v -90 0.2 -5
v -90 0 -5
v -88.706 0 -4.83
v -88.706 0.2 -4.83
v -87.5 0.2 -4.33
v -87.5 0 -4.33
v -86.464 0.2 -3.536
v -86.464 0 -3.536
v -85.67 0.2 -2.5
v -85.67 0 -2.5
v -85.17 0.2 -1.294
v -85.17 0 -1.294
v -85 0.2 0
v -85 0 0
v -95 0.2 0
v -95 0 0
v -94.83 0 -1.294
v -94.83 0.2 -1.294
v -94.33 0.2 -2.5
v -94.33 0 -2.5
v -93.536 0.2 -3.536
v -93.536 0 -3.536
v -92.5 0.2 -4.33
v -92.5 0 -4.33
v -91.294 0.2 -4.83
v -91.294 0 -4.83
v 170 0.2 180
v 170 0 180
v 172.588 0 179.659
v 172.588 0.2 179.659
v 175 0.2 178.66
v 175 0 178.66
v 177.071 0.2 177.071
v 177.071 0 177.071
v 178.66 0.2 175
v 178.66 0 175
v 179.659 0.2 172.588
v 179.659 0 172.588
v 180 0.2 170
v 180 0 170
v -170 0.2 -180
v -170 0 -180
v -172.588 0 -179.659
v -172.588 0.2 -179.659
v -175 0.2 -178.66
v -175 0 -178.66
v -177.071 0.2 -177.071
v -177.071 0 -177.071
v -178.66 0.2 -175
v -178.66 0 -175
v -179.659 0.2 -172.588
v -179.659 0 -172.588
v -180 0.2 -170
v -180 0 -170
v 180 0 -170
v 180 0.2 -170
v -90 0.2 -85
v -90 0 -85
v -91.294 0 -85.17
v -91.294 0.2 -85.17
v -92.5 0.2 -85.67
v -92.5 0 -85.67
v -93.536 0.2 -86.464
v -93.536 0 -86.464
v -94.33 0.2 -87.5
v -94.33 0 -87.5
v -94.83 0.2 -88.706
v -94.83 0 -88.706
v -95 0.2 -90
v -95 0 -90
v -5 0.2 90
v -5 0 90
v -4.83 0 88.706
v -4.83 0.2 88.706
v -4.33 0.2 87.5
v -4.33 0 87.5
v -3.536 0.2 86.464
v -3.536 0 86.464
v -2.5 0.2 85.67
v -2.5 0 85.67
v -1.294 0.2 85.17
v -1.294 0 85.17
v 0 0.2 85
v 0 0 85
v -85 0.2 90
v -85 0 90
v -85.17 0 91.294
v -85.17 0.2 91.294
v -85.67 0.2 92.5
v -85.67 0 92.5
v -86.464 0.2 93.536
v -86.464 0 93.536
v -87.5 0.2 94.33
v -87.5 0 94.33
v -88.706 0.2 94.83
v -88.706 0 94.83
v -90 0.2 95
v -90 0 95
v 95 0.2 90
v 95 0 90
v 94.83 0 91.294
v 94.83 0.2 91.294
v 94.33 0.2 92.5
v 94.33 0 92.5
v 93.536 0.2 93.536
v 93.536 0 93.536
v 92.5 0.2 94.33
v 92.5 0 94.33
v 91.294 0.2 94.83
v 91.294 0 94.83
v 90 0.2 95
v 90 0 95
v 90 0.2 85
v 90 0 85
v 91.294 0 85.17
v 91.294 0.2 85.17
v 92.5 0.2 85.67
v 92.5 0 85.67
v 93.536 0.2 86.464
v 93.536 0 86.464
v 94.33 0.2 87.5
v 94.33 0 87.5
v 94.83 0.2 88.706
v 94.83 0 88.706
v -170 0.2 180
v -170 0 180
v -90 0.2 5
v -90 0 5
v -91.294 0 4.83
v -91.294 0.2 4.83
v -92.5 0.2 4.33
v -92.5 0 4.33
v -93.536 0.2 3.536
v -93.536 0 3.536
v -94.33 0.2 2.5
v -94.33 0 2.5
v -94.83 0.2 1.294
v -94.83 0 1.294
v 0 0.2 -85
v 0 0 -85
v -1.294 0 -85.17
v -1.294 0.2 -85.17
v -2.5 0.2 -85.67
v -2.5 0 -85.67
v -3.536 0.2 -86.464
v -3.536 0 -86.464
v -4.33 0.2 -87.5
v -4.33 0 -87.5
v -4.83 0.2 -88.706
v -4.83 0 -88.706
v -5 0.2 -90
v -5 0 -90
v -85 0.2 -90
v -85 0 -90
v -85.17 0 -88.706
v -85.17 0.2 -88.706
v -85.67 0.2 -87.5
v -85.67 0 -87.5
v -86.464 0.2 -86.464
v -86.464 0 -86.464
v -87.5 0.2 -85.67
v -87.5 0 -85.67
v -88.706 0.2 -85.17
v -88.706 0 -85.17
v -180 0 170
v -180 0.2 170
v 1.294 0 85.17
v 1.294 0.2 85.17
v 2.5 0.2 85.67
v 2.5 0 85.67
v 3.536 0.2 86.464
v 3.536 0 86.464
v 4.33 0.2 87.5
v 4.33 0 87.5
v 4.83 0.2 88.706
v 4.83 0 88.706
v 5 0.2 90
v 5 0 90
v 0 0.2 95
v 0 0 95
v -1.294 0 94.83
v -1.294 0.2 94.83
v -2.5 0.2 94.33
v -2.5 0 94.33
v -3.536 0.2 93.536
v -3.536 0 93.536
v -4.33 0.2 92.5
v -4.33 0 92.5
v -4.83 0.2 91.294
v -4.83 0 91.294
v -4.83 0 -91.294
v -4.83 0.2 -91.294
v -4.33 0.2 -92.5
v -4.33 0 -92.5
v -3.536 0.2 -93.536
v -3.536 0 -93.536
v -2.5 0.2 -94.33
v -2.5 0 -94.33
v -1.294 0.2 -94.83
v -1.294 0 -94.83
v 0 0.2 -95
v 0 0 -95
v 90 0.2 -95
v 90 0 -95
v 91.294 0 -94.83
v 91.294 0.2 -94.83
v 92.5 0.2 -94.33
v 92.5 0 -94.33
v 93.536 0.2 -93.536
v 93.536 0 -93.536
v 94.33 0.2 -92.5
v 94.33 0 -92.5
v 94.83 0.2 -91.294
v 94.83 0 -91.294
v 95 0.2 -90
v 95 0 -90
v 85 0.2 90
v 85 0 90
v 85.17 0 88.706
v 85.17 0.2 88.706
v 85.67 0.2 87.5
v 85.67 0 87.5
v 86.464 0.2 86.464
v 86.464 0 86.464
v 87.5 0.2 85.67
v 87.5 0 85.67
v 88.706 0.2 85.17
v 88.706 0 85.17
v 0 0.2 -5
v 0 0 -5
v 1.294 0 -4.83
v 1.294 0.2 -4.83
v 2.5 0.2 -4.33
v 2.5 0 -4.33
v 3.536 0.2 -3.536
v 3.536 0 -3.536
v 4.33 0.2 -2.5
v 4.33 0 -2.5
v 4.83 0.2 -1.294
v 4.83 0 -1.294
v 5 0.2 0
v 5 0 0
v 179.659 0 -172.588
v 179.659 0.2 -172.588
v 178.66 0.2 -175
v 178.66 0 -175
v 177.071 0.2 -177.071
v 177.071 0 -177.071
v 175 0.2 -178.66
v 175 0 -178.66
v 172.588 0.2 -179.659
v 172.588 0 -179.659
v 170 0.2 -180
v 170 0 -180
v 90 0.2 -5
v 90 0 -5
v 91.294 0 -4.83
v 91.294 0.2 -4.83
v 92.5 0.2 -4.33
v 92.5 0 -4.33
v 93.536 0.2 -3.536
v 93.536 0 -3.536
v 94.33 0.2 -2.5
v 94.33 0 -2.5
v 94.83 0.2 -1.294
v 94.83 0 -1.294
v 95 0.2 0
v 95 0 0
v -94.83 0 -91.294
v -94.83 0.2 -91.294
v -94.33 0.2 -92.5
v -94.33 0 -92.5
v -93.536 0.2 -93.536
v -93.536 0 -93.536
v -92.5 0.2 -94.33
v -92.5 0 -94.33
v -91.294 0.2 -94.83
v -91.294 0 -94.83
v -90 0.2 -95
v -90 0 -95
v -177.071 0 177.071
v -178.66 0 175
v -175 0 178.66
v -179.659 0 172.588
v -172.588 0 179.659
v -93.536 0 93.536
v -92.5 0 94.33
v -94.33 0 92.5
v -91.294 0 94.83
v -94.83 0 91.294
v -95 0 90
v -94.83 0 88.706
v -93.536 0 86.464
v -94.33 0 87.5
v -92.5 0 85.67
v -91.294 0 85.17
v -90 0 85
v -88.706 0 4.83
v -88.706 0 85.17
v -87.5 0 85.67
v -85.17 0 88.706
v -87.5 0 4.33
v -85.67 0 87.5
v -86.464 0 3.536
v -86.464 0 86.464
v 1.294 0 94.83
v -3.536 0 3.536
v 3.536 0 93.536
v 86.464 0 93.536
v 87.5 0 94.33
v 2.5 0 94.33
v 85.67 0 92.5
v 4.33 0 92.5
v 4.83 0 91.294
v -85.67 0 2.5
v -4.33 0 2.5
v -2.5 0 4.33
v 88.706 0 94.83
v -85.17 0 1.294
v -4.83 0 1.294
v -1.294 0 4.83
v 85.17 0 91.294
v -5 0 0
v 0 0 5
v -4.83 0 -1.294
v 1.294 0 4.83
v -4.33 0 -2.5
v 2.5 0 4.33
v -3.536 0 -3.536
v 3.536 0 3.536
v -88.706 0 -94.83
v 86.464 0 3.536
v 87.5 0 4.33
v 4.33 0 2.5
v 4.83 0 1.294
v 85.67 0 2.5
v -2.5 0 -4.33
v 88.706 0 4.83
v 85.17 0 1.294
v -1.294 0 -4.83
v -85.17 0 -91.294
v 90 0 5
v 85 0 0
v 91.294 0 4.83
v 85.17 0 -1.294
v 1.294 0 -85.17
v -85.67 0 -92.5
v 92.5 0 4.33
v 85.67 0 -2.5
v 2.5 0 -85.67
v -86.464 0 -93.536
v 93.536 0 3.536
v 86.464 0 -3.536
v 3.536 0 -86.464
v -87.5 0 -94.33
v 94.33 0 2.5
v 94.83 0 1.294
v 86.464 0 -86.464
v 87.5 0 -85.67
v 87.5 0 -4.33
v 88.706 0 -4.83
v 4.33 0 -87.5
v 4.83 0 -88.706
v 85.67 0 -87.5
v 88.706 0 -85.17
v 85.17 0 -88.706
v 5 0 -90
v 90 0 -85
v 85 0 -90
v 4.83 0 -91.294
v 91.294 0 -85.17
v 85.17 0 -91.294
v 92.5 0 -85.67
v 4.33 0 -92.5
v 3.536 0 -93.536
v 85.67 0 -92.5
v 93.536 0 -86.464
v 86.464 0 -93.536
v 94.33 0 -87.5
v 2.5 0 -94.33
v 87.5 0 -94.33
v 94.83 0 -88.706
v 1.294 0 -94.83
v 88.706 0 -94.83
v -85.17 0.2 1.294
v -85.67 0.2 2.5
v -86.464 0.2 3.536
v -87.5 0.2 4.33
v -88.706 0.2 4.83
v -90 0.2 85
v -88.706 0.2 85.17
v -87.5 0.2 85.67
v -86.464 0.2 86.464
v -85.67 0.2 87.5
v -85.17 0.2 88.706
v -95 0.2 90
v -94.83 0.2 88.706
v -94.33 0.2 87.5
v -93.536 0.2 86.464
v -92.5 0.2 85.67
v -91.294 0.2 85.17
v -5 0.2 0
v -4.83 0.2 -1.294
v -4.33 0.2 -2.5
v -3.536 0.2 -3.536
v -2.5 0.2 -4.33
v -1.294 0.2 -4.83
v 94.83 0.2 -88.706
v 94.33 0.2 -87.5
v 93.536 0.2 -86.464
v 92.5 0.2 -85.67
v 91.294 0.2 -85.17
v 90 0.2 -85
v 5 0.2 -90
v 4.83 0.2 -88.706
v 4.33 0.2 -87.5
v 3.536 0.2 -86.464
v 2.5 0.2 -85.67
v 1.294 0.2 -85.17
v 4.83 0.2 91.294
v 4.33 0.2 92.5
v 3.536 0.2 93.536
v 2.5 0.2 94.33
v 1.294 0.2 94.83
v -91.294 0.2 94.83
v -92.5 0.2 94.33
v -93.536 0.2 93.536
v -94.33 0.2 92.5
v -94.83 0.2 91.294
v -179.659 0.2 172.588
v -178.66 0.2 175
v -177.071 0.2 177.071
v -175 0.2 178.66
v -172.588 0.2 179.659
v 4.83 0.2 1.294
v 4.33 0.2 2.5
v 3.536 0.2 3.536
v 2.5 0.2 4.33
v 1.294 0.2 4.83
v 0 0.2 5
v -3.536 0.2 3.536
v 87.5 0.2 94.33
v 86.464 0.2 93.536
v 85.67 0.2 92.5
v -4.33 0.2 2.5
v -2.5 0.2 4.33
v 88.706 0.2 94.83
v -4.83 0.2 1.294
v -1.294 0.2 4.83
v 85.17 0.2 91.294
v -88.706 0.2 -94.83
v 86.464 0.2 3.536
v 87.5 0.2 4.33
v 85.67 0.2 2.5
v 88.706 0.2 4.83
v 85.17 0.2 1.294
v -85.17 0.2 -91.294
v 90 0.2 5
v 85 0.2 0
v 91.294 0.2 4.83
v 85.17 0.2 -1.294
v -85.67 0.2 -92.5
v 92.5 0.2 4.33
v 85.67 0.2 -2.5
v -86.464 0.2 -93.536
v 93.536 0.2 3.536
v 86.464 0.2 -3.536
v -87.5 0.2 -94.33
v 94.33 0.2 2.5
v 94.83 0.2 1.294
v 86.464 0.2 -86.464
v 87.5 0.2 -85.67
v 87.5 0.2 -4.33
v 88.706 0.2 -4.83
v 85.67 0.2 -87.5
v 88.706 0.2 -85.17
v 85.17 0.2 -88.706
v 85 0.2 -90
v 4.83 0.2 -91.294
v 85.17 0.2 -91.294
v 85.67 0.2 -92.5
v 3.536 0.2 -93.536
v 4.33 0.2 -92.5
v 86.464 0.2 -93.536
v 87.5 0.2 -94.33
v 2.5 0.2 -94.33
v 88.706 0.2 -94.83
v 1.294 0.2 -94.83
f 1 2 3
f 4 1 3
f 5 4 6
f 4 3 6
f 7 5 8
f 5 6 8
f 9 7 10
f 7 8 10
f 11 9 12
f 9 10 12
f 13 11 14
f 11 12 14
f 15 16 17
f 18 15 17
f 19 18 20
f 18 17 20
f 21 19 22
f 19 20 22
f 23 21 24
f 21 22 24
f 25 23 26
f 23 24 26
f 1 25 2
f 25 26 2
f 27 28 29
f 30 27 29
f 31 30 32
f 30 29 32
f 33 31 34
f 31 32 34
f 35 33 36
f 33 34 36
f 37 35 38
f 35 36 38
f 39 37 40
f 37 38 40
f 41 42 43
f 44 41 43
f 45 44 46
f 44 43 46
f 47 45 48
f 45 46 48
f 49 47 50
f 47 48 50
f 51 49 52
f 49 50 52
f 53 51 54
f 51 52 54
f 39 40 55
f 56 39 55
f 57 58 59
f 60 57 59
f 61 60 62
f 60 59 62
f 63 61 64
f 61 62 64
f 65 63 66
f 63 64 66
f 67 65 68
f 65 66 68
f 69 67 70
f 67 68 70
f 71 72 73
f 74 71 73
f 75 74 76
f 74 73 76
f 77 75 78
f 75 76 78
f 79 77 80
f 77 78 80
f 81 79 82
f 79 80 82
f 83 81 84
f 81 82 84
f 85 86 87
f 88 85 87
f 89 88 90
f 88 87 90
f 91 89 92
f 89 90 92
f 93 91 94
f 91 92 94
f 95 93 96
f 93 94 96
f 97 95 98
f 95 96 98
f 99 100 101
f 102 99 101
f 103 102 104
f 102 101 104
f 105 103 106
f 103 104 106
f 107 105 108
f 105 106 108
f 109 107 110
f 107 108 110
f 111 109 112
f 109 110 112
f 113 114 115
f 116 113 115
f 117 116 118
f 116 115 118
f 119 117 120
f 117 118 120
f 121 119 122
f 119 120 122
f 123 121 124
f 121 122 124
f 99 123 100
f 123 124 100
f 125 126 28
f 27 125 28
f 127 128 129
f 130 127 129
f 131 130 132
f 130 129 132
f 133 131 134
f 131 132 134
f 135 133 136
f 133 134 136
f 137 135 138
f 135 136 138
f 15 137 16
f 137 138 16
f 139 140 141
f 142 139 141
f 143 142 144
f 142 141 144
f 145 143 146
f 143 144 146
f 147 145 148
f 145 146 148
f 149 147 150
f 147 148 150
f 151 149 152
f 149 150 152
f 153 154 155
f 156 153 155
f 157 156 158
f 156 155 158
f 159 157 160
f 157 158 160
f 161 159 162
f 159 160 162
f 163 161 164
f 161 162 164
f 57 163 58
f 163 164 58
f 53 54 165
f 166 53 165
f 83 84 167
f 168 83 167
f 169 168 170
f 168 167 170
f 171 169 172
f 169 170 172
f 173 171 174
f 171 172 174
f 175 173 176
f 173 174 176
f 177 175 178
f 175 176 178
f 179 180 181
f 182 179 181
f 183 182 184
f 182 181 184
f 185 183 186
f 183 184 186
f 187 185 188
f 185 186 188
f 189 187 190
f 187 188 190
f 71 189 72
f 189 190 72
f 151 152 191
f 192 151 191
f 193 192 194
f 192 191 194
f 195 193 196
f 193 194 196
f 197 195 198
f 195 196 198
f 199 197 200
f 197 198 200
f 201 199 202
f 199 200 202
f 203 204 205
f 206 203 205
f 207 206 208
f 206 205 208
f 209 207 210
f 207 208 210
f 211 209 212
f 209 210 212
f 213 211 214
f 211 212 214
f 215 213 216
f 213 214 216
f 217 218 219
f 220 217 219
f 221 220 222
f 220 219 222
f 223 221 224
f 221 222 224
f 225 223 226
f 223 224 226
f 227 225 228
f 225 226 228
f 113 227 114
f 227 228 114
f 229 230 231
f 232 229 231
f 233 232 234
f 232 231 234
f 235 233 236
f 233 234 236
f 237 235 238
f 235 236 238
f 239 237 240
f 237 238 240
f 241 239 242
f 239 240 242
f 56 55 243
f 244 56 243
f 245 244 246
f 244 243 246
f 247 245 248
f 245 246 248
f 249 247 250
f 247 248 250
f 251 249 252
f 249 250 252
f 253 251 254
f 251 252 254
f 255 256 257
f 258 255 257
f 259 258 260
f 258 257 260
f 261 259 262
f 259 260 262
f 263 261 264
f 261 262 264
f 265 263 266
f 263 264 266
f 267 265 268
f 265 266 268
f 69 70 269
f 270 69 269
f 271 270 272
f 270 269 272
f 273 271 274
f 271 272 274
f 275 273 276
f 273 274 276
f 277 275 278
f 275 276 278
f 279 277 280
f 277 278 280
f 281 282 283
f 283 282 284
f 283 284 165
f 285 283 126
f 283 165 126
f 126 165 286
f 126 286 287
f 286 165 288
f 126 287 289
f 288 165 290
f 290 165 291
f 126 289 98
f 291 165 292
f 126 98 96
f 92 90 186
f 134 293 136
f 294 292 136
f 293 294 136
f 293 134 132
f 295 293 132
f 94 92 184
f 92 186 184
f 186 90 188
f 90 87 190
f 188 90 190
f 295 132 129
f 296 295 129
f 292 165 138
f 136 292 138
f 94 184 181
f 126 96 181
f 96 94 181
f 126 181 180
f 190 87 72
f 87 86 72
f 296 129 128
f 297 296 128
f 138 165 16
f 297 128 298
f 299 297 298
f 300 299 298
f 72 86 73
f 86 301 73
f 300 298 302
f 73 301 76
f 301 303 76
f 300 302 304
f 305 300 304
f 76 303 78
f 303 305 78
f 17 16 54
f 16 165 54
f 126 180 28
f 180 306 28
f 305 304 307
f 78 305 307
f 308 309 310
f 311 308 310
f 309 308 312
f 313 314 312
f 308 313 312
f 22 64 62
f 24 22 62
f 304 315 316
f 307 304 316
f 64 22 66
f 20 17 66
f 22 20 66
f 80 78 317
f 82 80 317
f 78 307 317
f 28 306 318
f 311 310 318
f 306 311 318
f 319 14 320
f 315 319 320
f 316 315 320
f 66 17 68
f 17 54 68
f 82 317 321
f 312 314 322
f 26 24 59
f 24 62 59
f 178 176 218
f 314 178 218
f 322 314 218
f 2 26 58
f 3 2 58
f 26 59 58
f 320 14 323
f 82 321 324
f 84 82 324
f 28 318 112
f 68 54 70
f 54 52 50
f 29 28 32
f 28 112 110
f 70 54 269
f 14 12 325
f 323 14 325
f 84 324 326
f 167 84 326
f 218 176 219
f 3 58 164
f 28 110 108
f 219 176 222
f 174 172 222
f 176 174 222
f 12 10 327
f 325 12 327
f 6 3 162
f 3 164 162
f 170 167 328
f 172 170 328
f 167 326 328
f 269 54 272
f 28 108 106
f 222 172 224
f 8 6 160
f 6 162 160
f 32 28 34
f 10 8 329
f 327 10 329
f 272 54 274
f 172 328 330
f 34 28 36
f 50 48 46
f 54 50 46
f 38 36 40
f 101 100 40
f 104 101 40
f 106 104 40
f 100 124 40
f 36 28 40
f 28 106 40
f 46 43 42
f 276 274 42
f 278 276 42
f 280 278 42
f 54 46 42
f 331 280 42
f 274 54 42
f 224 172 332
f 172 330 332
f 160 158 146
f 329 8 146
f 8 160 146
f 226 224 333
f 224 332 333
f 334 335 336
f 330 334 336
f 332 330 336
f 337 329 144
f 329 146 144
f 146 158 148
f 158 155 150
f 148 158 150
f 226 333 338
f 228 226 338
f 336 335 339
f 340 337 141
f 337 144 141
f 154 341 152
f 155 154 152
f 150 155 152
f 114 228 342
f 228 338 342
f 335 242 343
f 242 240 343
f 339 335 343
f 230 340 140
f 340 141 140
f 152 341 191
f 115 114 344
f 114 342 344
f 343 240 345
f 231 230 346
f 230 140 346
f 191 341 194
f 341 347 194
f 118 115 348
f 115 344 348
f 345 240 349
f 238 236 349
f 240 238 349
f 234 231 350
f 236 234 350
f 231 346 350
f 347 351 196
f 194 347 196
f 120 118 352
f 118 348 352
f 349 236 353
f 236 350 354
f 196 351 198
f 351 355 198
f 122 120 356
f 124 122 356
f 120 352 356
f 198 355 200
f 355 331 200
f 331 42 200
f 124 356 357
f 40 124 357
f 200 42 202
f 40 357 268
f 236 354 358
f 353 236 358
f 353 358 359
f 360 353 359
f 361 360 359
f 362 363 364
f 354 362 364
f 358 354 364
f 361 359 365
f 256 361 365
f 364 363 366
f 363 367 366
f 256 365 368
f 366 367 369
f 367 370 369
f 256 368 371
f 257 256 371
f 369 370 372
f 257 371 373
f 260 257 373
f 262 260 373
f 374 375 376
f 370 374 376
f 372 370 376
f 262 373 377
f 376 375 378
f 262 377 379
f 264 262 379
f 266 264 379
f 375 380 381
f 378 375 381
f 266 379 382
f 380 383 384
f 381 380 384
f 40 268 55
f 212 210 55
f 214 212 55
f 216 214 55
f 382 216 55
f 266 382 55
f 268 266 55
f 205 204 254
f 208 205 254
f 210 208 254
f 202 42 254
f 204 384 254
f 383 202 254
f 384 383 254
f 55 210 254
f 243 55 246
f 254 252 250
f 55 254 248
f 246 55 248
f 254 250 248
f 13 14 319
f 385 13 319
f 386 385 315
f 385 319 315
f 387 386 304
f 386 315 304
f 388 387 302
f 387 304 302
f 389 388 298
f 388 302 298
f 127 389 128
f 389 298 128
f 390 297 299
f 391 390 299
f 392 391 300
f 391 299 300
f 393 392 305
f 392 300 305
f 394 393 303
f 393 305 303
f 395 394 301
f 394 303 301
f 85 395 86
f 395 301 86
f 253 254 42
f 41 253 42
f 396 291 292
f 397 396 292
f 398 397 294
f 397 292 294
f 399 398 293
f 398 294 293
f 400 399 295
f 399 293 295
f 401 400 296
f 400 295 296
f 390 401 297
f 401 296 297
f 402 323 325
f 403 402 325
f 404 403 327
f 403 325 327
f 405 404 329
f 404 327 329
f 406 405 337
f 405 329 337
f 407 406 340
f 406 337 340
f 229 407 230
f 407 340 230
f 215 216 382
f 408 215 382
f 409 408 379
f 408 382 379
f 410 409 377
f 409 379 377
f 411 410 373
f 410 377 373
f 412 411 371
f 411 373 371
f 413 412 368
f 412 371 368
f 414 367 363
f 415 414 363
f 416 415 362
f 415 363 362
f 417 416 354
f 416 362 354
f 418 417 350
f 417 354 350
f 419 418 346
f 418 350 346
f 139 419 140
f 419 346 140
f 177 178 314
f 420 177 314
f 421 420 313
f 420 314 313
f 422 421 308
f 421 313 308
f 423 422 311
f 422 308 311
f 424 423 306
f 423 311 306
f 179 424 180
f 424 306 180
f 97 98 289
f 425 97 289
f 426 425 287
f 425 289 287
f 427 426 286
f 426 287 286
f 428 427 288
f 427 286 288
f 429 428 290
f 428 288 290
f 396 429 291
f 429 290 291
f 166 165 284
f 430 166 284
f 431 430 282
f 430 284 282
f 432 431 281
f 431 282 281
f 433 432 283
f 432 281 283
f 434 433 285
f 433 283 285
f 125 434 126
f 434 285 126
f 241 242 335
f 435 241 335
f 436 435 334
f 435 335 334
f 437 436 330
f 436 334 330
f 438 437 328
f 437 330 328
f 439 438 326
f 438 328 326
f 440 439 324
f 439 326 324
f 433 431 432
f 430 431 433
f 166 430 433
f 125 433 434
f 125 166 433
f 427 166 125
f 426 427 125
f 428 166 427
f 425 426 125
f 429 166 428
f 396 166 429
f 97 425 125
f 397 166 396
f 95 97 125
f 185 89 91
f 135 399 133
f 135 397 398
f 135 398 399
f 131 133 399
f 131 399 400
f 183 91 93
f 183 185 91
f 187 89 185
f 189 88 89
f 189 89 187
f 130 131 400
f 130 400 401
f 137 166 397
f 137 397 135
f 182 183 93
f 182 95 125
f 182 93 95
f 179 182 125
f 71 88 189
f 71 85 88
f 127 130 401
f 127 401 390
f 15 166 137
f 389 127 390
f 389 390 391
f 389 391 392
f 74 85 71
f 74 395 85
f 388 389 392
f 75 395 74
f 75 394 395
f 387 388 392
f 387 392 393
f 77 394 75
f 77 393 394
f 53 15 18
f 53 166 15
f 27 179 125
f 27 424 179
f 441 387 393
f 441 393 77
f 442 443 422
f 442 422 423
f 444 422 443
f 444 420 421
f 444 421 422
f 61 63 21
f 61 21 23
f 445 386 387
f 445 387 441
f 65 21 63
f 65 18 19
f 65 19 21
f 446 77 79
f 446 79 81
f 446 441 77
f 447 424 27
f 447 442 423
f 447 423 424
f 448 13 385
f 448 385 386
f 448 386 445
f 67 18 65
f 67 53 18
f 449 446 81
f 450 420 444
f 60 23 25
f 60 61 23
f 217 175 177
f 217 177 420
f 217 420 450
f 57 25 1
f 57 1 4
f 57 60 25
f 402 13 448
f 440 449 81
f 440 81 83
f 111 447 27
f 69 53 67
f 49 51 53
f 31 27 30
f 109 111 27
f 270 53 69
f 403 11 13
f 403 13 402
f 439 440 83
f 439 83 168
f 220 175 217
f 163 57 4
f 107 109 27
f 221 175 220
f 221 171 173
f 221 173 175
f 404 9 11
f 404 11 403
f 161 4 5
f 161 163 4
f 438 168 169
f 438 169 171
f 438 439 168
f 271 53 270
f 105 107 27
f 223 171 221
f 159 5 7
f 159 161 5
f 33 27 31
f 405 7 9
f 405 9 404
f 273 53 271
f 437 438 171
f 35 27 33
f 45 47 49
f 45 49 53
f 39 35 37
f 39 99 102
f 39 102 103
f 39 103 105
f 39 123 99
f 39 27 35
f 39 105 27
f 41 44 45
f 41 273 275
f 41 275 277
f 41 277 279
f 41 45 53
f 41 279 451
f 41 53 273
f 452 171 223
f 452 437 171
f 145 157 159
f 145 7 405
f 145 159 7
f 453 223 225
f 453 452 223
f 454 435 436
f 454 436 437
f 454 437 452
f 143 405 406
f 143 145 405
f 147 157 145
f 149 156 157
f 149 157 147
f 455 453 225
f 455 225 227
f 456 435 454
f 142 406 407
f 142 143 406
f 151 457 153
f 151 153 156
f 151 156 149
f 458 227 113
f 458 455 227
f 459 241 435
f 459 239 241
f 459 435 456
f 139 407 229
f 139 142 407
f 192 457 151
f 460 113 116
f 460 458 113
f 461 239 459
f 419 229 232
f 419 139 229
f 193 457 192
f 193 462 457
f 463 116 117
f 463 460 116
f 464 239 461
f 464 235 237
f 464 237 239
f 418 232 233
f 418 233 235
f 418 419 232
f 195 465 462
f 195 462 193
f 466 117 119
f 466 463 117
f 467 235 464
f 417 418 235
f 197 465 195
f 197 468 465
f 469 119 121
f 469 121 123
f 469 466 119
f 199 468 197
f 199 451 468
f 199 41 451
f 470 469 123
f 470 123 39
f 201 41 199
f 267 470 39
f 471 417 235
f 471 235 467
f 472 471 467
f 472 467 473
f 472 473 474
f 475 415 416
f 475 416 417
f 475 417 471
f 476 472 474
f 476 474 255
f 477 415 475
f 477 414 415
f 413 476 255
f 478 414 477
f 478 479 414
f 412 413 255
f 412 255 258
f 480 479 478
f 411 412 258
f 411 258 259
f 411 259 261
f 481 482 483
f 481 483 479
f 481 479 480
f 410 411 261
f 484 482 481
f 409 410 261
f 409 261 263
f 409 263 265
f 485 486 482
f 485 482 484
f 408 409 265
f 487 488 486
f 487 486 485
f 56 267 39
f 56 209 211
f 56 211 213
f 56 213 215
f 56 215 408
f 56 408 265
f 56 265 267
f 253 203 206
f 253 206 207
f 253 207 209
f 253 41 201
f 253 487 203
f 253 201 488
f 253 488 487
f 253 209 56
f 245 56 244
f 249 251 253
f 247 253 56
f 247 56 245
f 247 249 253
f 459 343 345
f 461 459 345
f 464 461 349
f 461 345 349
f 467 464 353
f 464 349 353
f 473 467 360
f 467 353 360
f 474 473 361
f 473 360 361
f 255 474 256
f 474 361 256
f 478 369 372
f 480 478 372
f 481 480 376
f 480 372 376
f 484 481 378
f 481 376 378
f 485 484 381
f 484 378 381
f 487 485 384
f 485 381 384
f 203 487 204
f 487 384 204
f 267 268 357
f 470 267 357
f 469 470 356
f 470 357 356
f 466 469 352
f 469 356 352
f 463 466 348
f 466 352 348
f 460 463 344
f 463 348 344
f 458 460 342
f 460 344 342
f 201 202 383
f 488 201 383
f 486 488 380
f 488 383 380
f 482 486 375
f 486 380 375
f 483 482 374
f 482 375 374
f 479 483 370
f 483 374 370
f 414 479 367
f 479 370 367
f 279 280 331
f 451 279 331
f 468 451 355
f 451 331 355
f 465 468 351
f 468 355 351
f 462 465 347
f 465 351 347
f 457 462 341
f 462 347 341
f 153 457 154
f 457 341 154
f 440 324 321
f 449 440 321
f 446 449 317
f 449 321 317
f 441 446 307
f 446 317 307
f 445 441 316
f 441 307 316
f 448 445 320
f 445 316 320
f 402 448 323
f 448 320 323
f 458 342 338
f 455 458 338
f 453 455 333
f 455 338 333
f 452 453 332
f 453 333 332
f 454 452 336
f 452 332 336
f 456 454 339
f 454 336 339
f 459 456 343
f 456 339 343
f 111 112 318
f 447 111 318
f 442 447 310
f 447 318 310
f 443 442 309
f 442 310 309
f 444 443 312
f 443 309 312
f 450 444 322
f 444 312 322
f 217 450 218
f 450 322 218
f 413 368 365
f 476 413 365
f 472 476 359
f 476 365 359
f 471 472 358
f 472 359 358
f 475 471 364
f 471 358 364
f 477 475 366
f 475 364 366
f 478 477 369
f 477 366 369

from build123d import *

# Parameters (mm, degrees)
BOSS_EXTRUDE1_DEPTH = 0.2


with BuildPart() as part:
    # Sketch1 → Boss-Extrude1 (new body)
    with BuildSketch(Plane(origin=(0, 0, 0), x_dir=(1, 0, 0), z_dir=(0, 1, 0))):
        with BuildLine():
            Line((-90, 95), (-90, 180))
            Line((-90, 180), (-170, 180))
            ThreePointArc((-170, 180), (-177.071067812, 177.071067812), (-180, 170))
            Line((-180, 170), (-180, 90))
            Line((-180, 90), (-95, 90))
            ThreePointArc((-95, 90), (-93.535533906, 93.535533906), (-90, 95))
        make_face()
        with BuildLine():
            Line((0, 180), (-90, 180))
            Line((-90, 180), (-90, 95))
            ThreePointArc((-90, 95), (-86.464466094, 93.535533906), (-85, 90))
            Line((-85, 90), (-5, 90))
            ThreePointArc((-5, 90), (-3.535533906, 93.535533906), (0, 95))
            Line((0, 95), (0, 180))
        make_face()
        with BuildLine():
            Line((-5, 90), (-85, 90))
            ThreePointArc((-85, 90), (-86.464466094, 86.464466094), (-90, 85))
            Line((-90, 85), (-90, 5))
            ThreePointArc((-90, 5), (-86.464466094, 3.535533906), (-85, 0))
            Line((-85, 0), (-5, 0))
            ThreePointArc((-5, 0), (-3.535533906, 3.535533906), (0, 5))
            Line((0, 5), (0, 85))
            ThreePointArc((0, 85), (-3.535533906, 86.464466094), (-5, 90))
        make_face()
        with BuildLine():
            ThreePointArc((-90, 85), (-93.535533906, 86.464466094), (-95, 90))
            Line((-95, 90), (-180, 90))
            Line((-180, 90), (-180, 0))
            Line((-180, 0), (-95, 0))
            ThreePointArc((-95, 0), (-93.535533906, 3.535533906), (-90, 5))
            Line((-90, 5), (-90, 85))
        make_face()
        with BuildLine():
            Line((-95, 0), (-180, 0))
            Line((-180, 0), (-180, -90))
            Line((-180, -90), (-95, -90))
            ThreePointArc((-95, -90), (-93.535533906, -86.464466094), (-90, -85))
            Line((-90, -85), (-90, -5))
            ThreePointArc((-90, -5), (-93.535533906, -3.535533906), (-95, 0))
        make_face()
        with BuildLine():
            Line((-95, -90), (-180, -90))
            Line((-180, -90), (-180, -170))
            ThreePointArc((-180, -170), (-177.071067812, -177.071067812), (-170, -180))
            Line((-170, -180), (-90, -180))
            Line((-90, -180), (-90, -95))
            ThreePointArc((-90, -95), (-93.535533906, -93.535533906), (-95, -90))
        make_face()
        with BuildLine():
            ThreePointArc((-85, -90), (-86.464466094, -93.535533906), (-90, -95))
            Line((-90, -95), (-90, -180))
            Line((-90, -180), (0, -180))
            Line((0, -180), (0, -95))
            ThreePointArc((0, -95), (-3.535533906, -93.535533906), (-5, -90))
            Line((-5, -90), (-85, -90))
        make_face()
        with BuildLine():
            Line((-5, 0), (-85, 0))
            ThreePointArc((-85, 0), (-86.464466094, -3.535533906), (-90, -5))
            Line((-90, -5), (-90, -85))
            ThreePointArc((-90, -85), (-86.464466094, -86.464466094), (-85, -90))
            Line((-85, -90), (-5, -90))
            ThreePointArc((-5, -90), (-3.535533906, -86.464466094), (0, -85))
            Line((0, -85), (0, -5))
            ThreePointArc((0, -5), (-3.535533906, -3.535533906), (-5, 0))
        make_face()
        with BuildLine():
            Line((85, 0), (5, 0))
            ThreePointArc((5, 0), (3.535533906, -3.535533906), (0, -5))
            Line((0, -5), (0, -85))
            ThreePointArc((0, -85), (3.535533906, -86.464466094), (5, -90))
            Line((5, -90), (85, -90))
            ThreePointArc((85, -90), (86.464466094, -86.464466094), (90, -85))
            Line((90, -85), (90, -5))
            ThreePointArc((90, -5), (86.464466094, -3.535533906), (85, 0))
        make_face()
        with BuildLine():
            Line((85, -90), (5, -90))
            ThreePointArc((5, -90), (3.535533906, -93.535533906), (0, -95))
            Line((0, -95), (0, -180))
            Line((0, -180), (90, -180))
            Line((90, -180), (90, -95))
            ThreePointArc((90, -95), (86.464466094, -93.535533906), (85, -90))
        make_face()
        with BuildLine():
            Line((180, -170), (180, -90))
            Line((180, -90), (95, -90))
            ThreePointArc((95, -90), (93.535533906, -93.535533906), (90, -95))
            Line((90, -95), (90, -180))
            Line((90, -180), (170, -180))
            ThreePointArc((170, -180), (177.071067812, -177.071067812), (180, -170))
        make_face()
        with BuildLine():
            Line((180, -90), (180, 0))
            Line((180, 0), (95, 0))
            ThreePointArc((95, 0), (93.535533906, -3.535533906), (90, -5))
            Line((90, -5), (90, -85))
            ThreePointArc((90, -85), (93.535533906, -86.464466094), (95, -90))
            Line((95, -90), (180, -90))
        make_face()
        with BuildLine():
            Line((85, 90), (5, 90))
            ThreePointArc((5, 90), (3.535533906, 86.464466094), (0, 85))
            Line((0, 85), (0, 5))
            ThreePointArc((0, 5), (3.535533906, 3.535533906), (5, 0))
            Line((5, 0), (85, 0))
            ThreePointArc((85, 0), (86.464466094, 3.535533906), (90, 5))
            Line((90, 5), (90, 85))
            ThreePointArc((90, 85), (86.464466094, 86.464466094), (85, 90))
        make_face()
        with BuildLine():
            Line((180, 90), (95, 90))
            ThreePointArc((95, 90), (93.535533906, 86.464466094), (90, 85))
            Line((90, 85), (90, 5))
            ThreePointArc((90, 5), (93.535533906, 3.535533906), (95, 0))
            Line((95, 0), (180, 0))
            Line((180, 0), (180, 90))
        make_face()
        with BuildLine():
            Line((170, 180), (90, 180))
            Line((90, 180), (90, 95))
            ThreePointArc((90, 95), (93.535533906, 93.535533906), (95, 90))
            Line((95, 90), (180, 90))
            Line((180, 90), (180, 170))
            ThreePointArc((180, 170), (177.071067812, 177.071067812), (170, 180))
        make_face()
        with BuildLine():
            Line((90, 180), (0, 180))
            Line((0, 180), (0, 95))
            ThreePointArc((0, 95), (3.535533906, 93.535533906), (5, 90))
            Line((5, 90), (85, 90))
            ThreePointArc((85, 90), (86.464466094, 93.535533906), (90, 95))
            Line((90, 95), (90, 180))
        make_face()
    extrude(amount=BOSS_EXTRUDE1_DEPTH)


solid = part.part
